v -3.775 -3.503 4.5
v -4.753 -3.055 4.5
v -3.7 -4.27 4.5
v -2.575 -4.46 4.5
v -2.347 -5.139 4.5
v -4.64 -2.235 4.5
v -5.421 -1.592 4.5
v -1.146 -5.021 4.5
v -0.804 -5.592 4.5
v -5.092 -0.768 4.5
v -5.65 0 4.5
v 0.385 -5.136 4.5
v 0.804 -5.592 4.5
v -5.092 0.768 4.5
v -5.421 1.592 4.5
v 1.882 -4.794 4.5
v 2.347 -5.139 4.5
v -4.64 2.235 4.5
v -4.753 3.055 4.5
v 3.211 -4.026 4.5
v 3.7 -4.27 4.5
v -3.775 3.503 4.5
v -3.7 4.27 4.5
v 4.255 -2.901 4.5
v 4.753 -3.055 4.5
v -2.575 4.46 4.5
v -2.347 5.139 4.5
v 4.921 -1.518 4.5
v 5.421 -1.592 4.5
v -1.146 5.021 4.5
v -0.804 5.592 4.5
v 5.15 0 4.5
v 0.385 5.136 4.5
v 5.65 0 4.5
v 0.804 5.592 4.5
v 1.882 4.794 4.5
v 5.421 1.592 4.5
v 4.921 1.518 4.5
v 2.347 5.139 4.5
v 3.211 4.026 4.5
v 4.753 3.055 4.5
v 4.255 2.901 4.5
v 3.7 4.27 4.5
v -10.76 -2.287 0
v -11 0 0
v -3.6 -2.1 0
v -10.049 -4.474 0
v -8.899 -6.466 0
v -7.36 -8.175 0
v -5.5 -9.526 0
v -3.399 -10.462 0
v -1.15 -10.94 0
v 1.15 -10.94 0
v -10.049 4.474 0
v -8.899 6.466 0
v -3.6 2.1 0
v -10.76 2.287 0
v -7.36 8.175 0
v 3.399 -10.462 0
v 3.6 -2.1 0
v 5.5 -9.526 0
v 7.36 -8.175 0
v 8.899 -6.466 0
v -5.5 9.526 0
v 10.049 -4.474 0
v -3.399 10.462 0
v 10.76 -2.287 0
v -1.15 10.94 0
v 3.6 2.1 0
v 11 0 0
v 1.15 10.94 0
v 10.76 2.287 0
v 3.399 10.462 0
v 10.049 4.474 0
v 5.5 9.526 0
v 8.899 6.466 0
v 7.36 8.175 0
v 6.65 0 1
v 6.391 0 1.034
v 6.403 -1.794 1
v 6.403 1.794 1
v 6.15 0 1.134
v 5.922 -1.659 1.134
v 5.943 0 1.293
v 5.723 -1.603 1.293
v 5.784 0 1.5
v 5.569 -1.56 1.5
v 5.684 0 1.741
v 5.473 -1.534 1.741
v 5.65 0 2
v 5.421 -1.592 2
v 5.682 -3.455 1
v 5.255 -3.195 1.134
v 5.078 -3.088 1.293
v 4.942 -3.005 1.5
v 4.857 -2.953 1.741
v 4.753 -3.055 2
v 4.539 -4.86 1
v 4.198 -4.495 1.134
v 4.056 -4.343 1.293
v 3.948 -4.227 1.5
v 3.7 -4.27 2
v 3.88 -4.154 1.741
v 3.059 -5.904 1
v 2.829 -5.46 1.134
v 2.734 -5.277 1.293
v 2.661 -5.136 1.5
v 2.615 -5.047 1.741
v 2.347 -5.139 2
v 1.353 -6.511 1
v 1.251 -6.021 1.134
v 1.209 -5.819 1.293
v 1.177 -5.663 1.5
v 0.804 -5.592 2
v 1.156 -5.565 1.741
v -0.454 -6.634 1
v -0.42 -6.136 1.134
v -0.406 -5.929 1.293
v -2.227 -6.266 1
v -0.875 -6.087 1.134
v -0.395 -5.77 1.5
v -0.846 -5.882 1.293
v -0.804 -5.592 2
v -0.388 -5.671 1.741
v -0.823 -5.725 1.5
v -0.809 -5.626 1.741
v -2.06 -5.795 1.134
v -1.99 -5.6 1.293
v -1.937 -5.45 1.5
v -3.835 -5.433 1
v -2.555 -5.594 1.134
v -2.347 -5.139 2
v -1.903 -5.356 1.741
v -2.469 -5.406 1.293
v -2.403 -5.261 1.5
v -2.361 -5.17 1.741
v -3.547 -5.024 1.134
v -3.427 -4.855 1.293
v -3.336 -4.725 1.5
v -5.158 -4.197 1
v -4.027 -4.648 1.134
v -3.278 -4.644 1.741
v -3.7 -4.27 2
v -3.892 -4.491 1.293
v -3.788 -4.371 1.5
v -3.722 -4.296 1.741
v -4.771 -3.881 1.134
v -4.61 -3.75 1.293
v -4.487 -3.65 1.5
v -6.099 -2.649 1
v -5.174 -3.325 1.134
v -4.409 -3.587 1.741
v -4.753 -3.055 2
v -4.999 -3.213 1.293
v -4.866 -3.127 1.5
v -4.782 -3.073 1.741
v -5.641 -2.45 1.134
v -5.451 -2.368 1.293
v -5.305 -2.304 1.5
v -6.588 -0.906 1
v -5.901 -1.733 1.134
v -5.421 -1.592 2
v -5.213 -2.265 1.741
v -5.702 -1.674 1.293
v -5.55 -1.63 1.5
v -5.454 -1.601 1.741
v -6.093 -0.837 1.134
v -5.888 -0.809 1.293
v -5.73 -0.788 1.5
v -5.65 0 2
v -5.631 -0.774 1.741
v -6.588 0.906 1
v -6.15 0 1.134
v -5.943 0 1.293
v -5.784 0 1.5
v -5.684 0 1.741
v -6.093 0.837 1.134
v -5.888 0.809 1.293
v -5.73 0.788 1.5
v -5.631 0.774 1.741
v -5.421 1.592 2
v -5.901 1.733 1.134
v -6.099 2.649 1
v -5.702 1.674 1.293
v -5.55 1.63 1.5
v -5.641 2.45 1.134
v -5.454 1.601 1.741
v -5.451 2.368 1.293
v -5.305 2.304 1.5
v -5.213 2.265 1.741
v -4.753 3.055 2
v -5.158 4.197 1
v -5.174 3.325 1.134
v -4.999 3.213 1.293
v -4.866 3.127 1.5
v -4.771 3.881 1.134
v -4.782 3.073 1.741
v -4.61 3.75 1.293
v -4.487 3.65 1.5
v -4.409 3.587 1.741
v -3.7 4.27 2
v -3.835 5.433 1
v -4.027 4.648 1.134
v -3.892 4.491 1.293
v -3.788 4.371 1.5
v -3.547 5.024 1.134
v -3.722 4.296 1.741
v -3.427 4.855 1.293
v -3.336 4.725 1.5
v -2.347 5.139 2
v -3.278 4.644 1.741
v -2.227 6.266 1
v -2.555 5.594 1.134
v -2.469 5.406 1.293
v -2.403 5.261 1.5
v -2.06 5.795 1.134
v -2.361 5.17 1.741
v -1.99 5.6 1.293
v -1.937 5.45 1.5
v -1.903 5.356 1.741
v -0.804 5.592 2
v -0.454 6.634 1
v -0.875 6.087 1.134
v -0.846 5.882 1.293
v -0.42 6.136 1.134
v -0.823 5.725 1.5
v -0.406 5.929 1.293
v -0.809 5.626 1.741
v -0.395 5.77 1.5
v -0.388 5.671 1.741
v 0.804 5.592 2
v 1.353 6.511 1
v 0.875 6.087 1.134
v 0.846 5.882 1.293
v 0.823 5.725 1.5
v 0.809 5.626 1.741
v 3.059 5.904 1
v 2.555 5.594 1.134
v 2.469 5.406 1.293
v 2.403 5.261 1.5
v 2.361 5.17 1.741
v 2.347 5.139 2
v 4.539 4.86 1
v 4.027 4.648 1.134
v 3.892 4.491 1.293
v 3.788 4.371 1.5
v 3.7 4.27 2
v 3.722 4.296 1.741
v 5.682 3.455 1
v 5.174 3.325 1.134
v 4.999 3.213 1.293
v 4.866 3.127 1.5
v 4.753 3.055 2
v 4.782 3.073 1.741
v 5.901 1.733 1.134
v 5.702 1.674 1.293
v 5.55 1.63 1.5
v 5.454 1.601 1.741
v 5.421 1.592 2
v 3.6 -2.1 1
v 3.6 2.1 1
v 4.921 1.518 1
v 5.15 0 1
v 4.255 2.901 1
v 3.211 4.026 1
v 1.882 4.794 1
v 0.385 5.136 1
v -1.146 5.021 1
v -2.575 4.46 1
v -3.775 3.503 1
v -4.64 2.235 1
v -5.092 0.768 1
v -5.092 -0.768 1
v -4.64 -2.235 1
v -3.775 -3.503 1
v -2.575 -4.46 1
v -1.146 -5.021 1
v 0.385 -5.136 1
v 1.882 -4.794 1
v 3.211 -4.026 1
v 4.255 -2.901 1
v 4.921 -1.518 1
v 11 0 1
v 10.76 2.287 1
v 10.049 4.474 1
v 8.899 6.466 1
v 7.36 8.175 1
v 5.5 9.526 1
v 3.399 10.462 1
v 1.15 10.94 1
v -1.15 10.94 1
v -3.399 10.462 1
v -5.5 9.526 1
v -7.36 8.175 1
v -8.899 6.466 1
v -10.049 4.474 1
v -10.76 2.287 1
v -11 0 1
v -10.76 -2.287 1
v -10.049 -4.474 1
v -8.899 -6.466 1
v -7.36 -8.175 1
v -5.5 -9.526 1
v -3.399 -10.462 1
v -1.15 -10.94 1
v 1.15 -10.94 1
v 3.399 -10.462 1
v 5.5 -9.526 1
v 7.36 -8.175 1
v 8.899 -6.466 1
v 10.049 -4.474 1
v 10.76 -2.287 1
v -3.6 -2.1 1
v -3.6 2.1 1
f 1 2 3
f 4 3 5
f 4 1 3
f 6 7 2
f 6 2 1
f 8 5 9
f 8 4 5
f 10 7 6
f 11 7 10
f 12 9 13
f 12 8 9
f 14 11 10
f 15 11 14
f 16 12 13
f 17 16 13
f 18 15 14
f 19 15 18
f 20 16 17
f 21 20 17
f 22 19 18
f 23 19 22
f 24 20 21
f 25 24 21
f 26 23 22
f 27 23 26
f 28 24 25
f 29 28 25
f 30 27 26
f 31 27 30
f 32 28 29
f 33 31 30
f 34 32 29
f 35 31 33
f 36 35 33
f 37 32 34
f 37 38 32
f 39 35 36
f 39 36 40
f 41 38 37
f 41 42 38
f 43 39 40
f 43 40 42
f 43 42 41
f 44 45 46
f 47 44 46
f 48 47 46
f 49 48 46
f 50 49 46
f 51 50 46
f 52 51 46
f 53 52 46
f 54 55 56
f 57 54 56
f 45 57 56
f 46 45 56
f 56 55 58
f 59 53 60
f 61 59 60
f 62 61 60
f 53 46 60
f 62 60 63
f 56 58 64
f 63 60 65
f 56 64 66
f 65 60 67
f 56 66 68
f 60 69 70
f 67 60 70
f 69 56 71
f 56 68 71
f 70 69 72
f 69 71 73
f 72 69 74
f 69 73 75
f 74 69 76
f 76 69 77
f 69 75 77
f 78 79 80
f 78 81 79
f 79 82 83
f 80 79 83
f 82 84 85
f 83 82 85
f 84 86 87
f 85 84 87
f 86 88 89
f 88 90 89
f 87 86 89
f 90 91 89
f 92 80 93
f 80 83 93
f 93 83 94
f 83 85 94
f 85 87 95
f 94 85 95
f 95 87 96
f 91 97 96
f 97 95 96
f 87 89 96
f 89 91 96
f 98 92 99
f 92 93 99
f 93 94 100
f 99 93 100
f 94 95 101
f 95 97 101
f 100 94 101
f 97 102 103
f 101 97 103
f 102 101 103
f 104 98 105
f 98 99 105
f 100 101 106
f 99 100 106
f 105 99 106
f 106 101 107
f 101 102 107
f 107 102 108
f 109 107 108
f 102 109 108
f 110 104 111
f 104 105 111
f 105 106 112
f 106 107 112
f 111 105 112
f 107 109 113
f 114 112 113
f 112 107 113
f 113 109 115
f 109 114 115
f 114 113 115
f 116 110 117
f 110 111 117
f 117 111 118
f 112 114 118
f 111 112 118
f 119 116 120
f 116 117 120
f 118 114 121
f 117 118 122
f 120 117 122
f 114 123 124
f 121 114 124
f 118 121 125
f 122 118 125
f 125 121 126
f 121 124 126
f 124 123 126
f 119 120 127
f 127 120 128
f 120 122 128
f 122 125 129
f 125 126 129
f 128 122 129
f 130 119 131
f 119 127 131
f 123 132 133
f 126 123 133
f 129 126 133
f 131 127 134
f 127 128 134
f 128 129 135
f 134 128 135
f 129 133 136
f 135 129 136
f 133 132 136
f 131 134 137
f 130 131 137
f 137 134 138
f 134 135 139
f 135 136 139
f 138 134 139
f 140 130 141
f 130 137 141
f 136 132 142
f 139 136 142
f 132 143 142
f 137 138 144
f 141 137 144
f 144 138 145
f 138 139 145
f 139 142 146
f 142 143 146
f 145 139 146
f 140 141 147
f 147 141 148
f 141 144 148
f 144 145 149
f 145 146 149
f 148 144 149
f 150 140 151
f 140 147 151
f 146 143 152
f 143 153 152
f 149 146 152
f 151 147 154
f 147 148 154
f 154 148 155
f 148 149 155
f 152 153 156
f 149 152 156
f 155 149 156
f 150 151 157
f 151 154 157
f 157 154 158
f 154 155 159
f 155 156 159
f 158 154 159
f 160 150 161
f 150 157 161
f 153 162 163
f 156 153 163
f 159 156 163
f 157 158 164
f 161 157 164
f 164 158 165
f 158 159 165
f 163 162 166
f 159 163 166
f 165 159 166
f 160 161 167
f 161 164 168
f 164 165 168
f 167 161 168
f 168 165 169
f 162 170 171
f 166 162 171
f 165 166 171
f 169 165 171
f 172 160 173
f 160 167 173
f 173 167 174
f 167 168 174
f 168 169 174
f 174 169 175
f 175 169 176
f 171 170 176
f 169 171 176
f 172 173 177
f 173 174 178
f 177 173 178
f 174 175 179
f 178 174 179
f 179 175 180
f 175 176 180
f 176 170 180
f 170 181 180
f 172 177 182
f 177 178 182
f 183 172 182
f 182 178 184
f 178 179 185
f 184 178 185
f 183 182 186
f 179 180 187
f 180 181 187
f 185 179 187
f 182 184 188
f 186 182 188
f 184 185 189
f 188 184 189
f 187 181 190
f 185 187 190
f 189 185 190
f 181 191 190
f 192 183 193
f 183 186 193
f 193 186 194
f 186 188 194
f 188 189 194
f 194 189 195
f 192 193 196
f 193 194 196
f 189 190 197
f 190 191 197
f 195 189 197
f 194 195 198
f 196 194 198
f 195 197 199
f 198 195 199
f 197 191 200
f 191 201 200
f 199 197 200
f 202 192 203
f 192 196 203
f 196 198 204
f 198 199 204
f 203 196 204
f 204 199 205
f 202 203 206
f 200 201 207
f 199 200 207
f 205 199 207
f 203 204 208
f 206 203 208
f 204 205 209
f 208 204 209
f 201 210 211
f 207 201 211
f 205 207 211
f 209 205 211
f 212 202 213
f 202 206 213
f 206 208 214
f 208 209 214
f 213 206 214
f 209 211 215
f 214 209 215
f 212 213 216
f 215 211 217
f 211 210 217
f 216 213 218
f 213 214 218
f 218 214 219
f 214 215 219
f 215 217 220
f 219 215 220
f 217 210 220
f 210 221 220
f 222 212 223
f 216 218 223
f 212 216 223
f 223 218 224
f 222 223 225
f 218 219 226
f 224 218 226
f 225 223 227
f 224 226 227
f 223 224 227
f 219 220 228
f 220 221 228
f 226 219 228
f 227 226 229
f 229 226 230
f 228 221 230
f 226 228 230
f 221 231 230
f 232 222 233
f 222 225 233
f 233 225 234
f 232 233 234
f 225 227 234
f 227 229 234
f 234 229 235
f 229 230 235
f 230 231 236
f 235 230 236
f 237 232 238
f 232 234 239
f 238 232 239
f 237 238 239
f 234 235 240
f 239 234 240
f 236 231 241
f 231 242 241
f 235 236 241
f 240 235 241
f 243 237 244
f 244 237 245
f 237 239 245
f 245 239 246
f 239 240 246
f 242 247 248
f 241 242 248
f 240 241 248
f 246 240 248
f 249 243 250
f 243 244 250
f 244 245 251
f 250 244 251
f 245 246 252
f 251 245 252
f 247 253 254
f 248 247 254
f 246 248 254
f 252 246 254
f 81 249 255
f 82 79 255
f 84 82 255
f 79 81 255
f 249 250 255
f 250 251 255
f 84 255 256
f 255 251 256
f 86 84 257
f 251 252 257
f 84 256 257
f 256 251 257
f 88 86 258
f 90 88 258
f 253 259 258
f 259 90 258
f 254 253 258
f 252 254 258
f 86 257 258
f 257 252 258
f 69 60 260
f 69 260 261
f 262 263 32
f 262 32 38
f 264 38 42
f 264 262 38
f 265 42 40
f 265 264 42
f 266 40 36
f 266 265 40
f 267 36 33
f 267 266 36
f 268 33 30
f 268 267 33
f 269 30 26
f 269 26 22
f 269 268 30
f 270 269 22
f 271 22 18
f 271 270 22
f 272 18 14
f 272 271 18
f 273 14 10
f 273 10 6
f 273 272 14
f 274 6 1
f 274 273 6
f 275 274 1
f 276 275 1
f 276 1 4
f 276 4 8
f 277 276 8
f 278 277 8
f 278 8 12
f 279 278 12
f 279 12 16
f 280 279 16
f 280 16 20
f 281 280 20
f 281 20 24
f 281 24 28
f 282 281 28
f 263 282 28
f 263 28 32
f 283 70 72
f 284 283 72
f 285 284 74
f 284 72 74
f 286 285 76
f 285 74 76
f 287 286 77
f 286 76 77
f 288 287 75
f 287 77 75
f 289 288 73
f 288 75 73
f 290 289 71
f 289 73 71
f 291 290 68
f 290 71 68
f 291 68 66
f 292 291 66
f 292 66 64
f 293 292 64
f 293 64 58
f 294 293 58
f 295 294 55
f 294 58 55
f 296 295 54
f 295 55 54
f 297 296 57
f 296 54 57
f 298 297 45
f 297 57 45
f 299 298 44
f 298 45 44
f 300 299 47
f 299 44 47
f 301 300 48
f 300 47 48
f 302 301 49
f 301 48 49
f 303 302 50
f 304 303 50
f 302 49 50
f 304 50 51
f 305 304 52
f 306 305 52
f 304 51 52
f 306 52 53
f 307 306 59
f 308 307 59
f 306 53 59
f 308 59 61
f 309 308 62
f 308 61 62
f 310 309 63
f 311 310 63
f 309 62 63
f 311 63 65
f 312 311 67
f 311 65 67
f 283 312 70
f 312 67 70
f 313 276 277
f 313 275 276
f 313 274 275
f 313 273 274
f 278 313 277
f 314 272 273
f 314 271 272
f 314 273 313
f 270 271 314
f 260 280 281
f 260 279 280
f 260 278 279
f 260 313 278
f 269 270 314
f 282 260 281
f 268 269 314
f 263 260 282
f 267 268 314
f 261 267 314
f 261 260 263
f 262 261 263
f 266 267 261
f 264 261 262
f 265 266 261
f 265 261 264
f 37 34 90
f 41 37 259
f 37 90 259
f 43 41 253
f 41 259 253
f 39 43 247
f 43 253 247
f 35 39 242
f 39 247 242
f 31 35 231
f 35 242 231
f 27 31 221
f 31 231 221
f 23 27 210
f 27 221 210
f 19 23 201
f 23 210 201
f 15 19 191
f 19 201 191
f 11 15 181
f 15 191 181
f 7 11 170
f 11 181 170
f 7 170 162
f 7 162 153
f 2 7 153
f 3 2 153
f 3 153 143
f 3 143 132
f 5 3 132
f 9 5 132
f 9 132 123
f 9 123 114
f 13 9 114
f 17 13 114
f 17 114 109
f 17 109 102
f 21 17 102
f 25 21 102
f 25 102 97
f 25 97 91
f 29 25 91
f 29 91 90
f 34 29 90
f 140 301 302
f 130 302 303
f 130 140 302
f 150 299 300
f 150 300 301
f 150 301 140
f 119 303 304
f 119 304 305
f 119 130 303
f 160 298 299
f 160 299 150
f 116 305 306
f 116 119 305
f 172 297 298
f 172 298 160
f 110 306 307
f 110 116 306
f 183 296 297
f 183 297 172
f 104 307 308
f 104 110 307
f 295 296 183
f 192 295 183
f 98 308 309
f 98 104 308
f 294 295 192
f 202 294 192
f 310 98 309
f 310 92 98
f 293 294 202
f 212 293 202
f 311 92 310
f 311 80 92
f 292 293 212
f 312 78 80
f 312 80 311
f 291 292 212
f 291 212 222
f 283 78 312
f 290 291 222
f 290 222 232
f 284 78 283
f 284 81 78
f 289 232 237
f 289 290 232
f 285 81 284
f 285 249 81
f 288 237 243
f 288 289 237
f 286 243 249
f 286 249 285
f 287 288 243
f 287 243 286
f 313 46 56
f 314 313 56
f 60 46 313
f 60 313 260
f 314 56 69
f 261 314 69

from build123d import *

# Parameters (mm, degrees)
F1_R     = 11
F1_W     = 7.2
F1_H     = 4.2
F2_DEPTH = 1
F0_R     = 5.65
F0_R_2   = 5.15
F3_DEPTH = 4.5
F4_R     = 1


with BuildPart() as f2:
    # F1 (on Top) → F2 (new body)
    with BuildSketch(Plane.XY):
        Circle(F1_R)
        Rectangle(F1_W, F1_H, mode=Mode.SUBTRACT)
    extrude(amount=F2_DEPTH)

    # F0 (on Top) → F3 (join)
    with BuildSketch(Plane.XY):
        Circle(F0_R)
        Circle(F0_R_2, mode=Mode.SUBTRACT)
    extrude(amount=F3_DEPTH)

    # F4
    f4_edges = [f2.edges().sort_by_distance(p)[0] for p in [
        (-5.65, 0, 1),
    ]]
    fillet(f4_edges, radius=F4_R)


solid = f2.part
